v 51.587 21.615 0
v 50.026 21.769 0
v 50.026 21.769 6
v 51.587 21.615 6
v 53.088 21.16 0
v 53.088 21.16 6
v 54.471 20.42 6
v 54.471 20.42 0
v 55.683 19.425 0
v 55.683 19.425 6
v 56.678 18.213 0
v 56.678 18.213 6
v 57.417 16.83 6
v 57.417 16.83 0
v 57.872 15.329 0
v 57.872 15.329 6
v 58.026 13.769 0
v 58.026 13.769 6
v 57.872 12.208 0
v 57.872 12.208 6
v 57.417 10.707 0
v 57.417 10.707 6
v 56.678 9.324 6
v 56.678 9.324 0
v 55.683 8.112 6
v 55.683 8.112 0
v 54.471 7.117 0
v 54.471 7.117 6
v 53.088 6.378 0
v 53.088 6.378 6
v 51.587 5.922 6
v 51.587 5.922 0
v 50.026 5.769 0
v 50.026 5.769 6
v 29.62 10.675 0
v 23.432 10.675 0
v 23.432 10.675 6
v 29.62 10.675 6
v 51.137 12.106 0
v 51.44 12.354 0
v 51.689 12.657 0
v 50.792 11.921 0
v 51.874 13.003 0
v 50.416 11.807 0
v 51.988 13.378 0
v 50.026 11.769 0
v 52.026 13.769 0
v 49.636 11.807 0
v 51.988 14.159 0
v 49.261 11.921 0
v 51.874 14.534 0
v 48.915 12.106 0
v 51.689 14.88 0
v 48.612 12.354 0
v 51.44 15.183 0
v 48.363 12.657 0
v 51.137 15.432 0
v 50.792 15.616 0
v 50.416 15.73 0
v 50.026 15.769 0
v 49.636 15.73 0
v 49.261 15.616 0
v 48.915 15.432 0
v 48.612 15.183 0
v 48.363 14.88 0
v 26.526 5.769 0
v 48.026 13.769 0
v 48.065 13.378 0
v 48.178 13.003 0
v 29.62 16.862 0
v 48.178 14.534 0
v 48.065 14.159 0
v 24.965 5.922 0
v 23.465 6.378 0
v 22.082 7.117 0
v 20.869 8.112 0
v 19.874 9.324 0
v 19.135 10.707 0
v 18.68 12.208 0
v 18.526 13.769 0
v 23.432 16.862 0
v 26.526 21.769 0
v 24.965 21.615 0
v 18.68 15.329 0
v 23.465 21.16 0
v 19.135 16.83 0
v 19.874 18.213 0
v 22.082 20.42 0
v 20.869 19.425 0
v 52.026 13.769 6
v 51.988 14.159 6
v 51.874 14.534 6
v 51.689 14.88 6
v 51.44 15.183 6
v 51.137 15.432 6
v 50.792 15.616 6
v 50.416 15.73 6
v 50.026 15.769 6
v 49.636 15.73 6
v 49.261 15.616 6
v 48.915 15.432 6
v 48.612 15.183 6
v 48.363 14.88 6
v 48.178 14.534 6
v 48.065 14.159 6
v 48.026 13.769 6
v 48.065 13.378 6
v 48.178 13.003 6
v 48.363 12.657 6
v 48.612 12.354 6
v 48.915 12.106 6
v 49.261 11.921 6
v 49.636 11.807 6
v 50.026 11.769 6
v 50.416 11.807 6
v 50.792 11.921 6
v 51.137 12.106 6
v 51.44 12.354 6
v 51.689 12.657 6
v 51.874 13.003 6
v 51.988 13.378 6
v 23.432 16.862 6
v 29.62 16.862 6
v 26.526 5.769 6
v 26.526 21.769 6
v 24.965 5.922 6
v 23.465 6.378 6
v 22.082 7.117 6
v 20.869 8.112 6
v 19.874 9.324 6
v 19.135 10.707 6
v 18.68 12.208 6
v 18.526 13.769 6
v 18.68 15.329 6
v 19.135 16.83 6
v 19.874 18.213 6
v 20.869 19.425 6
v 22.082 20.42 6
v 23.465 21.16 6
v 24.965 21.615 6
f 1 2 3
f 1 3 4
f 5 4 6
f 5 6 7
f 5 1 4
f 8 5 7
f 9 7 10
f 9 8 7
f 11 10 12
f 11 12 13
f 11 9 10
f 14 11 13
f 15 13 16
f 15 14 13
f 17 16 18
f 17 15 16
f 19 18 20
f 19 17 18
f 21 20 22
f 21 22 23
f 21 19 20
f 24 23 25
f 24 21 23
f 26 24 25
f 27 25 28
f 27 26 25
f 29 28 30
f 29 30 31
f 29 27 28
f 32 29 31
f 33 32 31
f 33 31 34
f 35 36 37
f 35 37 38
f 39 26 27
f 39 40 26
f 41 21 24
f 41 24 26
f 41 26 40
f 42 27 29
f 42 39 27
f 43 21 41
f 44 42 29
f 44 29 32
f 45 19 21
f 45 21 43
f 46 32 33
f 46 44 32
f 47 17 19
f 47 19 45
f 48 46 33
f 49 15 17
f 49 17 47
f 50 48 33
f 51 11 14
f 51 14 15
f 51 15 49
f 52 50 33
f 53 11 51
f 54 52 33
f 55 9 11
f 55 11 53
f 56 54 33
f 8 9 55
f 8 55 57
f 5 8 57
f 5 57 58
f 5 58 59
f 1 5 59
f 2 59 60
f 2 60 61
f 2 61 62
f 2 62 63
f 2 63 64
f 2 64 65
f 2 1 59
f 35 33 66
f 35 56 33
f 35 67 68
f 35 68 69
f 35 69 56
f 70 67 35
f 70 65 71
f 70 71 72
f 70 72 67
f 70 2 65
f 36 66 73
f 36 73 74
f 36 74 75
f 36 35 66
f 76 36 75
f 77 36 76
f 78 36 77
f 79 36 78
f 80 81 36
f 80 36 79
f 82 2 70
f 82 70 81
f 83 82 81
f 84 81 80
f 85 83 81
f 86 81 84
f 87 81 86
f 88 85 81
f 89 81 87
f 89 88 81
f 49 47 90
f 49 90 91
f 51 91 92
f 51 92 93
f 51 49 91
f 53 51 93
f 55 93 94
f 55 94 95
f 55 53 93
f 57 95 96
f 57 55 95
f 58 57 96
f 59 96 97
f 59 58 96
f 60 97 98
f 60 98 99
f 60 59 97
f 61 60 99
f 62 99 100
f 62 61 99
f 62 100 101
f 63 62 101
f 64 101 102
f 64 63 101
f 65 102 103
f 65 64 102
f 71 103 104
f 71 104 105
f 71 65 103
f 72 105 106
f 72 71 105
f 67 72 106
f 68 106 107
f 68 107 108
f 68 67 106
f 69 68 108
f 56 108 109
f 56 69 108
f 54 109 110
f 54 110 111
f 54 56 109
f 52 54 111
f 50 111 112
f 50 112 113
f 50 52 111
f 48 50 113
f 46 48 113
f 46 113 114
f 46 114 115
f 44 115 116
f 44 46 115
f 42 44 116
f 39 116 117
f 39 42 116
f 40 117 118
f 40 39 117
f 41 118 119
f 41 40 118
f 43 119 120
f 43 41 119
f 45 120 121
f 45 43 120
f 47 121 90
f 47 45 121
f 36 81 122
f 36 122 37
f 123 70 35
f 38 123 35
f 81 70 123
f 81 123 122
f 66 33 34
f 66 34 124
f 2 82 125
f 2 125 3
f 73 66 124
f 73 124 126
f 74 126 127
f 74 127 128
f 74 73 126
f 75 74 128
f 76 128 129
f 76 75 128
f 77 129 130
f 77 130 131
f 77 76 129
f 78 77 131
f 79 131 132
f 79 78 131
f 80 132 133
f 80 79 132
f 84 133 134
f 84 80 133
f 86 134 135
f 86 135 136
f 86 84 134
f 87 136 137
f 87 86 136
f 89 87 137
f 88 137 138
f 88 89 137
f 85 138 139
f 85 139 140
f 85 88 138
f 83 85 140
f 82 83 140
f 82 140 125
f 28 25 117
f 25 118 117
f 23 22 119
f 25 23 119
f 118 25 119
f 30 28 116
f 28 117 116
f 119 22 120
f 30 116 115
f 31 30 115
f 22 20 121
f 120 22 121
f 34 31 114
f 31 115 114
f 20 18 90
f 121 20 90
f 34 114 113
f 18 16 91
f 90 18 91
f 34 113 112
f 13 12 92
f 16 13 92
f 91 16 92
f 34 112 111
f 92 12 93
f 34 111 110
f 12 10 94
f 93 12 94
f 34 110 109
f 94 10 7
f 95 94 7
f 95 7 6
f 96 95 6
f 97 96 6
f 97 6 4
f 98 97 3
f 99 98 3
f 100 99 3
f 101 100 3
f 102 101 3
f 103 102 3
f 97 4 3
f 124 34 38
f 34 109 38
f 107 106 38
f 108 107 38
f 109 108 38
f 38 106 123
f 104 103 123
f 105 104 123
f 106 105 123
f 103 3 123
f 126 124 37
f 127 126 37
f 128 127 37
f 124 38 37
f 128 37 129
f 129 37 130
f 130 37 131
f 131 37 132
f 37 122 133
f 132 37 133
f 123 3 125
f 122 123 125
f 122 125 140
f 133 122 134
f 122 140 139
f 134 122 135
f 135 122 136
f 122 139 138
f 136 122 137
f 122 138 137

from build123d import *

# Parameters (mm, degrees)
MODEL_R             = 2
BOSS_EXTRUDE1_DEPTH = 6


with BuildPart() as part:
    # Model → Boss-Extrude1 (new body)
    with BuildSketch(Plane.XY):
        with BuildLine():
            Line((26.526195336, 21.768592837), (50.026195336, 21.768592837))
            ThreePointArc((50.026195336, 21.768592837), (58.026195336, 13.768592837), (50.026195336, 5.768592837))
            Line((50.026195336, 5.768592837), (26.526195336, 5.768592837))
            ThreePointArc((26.526195336, 5.768592837), (18.526195336, 13.768592837), (26.526195336, 21.768592837))
        make_face()
        with Locations((50.026195336, 13.768592837)):
            Circle(MODEL_R, mode=Mode.SUBTRACT)
        Polygon((29.619945336, 13.768592837), (29.619945336, 16.862342837), (23.432445336, 16.862342837), (23.432445336, 10.674842837), (29.619945336, 10.674842837), align=None, mode=Mode.SUBTRACT)
    extrude(amount=BOSS_EXTRUDE1_DEPTH)


solid = part.part
